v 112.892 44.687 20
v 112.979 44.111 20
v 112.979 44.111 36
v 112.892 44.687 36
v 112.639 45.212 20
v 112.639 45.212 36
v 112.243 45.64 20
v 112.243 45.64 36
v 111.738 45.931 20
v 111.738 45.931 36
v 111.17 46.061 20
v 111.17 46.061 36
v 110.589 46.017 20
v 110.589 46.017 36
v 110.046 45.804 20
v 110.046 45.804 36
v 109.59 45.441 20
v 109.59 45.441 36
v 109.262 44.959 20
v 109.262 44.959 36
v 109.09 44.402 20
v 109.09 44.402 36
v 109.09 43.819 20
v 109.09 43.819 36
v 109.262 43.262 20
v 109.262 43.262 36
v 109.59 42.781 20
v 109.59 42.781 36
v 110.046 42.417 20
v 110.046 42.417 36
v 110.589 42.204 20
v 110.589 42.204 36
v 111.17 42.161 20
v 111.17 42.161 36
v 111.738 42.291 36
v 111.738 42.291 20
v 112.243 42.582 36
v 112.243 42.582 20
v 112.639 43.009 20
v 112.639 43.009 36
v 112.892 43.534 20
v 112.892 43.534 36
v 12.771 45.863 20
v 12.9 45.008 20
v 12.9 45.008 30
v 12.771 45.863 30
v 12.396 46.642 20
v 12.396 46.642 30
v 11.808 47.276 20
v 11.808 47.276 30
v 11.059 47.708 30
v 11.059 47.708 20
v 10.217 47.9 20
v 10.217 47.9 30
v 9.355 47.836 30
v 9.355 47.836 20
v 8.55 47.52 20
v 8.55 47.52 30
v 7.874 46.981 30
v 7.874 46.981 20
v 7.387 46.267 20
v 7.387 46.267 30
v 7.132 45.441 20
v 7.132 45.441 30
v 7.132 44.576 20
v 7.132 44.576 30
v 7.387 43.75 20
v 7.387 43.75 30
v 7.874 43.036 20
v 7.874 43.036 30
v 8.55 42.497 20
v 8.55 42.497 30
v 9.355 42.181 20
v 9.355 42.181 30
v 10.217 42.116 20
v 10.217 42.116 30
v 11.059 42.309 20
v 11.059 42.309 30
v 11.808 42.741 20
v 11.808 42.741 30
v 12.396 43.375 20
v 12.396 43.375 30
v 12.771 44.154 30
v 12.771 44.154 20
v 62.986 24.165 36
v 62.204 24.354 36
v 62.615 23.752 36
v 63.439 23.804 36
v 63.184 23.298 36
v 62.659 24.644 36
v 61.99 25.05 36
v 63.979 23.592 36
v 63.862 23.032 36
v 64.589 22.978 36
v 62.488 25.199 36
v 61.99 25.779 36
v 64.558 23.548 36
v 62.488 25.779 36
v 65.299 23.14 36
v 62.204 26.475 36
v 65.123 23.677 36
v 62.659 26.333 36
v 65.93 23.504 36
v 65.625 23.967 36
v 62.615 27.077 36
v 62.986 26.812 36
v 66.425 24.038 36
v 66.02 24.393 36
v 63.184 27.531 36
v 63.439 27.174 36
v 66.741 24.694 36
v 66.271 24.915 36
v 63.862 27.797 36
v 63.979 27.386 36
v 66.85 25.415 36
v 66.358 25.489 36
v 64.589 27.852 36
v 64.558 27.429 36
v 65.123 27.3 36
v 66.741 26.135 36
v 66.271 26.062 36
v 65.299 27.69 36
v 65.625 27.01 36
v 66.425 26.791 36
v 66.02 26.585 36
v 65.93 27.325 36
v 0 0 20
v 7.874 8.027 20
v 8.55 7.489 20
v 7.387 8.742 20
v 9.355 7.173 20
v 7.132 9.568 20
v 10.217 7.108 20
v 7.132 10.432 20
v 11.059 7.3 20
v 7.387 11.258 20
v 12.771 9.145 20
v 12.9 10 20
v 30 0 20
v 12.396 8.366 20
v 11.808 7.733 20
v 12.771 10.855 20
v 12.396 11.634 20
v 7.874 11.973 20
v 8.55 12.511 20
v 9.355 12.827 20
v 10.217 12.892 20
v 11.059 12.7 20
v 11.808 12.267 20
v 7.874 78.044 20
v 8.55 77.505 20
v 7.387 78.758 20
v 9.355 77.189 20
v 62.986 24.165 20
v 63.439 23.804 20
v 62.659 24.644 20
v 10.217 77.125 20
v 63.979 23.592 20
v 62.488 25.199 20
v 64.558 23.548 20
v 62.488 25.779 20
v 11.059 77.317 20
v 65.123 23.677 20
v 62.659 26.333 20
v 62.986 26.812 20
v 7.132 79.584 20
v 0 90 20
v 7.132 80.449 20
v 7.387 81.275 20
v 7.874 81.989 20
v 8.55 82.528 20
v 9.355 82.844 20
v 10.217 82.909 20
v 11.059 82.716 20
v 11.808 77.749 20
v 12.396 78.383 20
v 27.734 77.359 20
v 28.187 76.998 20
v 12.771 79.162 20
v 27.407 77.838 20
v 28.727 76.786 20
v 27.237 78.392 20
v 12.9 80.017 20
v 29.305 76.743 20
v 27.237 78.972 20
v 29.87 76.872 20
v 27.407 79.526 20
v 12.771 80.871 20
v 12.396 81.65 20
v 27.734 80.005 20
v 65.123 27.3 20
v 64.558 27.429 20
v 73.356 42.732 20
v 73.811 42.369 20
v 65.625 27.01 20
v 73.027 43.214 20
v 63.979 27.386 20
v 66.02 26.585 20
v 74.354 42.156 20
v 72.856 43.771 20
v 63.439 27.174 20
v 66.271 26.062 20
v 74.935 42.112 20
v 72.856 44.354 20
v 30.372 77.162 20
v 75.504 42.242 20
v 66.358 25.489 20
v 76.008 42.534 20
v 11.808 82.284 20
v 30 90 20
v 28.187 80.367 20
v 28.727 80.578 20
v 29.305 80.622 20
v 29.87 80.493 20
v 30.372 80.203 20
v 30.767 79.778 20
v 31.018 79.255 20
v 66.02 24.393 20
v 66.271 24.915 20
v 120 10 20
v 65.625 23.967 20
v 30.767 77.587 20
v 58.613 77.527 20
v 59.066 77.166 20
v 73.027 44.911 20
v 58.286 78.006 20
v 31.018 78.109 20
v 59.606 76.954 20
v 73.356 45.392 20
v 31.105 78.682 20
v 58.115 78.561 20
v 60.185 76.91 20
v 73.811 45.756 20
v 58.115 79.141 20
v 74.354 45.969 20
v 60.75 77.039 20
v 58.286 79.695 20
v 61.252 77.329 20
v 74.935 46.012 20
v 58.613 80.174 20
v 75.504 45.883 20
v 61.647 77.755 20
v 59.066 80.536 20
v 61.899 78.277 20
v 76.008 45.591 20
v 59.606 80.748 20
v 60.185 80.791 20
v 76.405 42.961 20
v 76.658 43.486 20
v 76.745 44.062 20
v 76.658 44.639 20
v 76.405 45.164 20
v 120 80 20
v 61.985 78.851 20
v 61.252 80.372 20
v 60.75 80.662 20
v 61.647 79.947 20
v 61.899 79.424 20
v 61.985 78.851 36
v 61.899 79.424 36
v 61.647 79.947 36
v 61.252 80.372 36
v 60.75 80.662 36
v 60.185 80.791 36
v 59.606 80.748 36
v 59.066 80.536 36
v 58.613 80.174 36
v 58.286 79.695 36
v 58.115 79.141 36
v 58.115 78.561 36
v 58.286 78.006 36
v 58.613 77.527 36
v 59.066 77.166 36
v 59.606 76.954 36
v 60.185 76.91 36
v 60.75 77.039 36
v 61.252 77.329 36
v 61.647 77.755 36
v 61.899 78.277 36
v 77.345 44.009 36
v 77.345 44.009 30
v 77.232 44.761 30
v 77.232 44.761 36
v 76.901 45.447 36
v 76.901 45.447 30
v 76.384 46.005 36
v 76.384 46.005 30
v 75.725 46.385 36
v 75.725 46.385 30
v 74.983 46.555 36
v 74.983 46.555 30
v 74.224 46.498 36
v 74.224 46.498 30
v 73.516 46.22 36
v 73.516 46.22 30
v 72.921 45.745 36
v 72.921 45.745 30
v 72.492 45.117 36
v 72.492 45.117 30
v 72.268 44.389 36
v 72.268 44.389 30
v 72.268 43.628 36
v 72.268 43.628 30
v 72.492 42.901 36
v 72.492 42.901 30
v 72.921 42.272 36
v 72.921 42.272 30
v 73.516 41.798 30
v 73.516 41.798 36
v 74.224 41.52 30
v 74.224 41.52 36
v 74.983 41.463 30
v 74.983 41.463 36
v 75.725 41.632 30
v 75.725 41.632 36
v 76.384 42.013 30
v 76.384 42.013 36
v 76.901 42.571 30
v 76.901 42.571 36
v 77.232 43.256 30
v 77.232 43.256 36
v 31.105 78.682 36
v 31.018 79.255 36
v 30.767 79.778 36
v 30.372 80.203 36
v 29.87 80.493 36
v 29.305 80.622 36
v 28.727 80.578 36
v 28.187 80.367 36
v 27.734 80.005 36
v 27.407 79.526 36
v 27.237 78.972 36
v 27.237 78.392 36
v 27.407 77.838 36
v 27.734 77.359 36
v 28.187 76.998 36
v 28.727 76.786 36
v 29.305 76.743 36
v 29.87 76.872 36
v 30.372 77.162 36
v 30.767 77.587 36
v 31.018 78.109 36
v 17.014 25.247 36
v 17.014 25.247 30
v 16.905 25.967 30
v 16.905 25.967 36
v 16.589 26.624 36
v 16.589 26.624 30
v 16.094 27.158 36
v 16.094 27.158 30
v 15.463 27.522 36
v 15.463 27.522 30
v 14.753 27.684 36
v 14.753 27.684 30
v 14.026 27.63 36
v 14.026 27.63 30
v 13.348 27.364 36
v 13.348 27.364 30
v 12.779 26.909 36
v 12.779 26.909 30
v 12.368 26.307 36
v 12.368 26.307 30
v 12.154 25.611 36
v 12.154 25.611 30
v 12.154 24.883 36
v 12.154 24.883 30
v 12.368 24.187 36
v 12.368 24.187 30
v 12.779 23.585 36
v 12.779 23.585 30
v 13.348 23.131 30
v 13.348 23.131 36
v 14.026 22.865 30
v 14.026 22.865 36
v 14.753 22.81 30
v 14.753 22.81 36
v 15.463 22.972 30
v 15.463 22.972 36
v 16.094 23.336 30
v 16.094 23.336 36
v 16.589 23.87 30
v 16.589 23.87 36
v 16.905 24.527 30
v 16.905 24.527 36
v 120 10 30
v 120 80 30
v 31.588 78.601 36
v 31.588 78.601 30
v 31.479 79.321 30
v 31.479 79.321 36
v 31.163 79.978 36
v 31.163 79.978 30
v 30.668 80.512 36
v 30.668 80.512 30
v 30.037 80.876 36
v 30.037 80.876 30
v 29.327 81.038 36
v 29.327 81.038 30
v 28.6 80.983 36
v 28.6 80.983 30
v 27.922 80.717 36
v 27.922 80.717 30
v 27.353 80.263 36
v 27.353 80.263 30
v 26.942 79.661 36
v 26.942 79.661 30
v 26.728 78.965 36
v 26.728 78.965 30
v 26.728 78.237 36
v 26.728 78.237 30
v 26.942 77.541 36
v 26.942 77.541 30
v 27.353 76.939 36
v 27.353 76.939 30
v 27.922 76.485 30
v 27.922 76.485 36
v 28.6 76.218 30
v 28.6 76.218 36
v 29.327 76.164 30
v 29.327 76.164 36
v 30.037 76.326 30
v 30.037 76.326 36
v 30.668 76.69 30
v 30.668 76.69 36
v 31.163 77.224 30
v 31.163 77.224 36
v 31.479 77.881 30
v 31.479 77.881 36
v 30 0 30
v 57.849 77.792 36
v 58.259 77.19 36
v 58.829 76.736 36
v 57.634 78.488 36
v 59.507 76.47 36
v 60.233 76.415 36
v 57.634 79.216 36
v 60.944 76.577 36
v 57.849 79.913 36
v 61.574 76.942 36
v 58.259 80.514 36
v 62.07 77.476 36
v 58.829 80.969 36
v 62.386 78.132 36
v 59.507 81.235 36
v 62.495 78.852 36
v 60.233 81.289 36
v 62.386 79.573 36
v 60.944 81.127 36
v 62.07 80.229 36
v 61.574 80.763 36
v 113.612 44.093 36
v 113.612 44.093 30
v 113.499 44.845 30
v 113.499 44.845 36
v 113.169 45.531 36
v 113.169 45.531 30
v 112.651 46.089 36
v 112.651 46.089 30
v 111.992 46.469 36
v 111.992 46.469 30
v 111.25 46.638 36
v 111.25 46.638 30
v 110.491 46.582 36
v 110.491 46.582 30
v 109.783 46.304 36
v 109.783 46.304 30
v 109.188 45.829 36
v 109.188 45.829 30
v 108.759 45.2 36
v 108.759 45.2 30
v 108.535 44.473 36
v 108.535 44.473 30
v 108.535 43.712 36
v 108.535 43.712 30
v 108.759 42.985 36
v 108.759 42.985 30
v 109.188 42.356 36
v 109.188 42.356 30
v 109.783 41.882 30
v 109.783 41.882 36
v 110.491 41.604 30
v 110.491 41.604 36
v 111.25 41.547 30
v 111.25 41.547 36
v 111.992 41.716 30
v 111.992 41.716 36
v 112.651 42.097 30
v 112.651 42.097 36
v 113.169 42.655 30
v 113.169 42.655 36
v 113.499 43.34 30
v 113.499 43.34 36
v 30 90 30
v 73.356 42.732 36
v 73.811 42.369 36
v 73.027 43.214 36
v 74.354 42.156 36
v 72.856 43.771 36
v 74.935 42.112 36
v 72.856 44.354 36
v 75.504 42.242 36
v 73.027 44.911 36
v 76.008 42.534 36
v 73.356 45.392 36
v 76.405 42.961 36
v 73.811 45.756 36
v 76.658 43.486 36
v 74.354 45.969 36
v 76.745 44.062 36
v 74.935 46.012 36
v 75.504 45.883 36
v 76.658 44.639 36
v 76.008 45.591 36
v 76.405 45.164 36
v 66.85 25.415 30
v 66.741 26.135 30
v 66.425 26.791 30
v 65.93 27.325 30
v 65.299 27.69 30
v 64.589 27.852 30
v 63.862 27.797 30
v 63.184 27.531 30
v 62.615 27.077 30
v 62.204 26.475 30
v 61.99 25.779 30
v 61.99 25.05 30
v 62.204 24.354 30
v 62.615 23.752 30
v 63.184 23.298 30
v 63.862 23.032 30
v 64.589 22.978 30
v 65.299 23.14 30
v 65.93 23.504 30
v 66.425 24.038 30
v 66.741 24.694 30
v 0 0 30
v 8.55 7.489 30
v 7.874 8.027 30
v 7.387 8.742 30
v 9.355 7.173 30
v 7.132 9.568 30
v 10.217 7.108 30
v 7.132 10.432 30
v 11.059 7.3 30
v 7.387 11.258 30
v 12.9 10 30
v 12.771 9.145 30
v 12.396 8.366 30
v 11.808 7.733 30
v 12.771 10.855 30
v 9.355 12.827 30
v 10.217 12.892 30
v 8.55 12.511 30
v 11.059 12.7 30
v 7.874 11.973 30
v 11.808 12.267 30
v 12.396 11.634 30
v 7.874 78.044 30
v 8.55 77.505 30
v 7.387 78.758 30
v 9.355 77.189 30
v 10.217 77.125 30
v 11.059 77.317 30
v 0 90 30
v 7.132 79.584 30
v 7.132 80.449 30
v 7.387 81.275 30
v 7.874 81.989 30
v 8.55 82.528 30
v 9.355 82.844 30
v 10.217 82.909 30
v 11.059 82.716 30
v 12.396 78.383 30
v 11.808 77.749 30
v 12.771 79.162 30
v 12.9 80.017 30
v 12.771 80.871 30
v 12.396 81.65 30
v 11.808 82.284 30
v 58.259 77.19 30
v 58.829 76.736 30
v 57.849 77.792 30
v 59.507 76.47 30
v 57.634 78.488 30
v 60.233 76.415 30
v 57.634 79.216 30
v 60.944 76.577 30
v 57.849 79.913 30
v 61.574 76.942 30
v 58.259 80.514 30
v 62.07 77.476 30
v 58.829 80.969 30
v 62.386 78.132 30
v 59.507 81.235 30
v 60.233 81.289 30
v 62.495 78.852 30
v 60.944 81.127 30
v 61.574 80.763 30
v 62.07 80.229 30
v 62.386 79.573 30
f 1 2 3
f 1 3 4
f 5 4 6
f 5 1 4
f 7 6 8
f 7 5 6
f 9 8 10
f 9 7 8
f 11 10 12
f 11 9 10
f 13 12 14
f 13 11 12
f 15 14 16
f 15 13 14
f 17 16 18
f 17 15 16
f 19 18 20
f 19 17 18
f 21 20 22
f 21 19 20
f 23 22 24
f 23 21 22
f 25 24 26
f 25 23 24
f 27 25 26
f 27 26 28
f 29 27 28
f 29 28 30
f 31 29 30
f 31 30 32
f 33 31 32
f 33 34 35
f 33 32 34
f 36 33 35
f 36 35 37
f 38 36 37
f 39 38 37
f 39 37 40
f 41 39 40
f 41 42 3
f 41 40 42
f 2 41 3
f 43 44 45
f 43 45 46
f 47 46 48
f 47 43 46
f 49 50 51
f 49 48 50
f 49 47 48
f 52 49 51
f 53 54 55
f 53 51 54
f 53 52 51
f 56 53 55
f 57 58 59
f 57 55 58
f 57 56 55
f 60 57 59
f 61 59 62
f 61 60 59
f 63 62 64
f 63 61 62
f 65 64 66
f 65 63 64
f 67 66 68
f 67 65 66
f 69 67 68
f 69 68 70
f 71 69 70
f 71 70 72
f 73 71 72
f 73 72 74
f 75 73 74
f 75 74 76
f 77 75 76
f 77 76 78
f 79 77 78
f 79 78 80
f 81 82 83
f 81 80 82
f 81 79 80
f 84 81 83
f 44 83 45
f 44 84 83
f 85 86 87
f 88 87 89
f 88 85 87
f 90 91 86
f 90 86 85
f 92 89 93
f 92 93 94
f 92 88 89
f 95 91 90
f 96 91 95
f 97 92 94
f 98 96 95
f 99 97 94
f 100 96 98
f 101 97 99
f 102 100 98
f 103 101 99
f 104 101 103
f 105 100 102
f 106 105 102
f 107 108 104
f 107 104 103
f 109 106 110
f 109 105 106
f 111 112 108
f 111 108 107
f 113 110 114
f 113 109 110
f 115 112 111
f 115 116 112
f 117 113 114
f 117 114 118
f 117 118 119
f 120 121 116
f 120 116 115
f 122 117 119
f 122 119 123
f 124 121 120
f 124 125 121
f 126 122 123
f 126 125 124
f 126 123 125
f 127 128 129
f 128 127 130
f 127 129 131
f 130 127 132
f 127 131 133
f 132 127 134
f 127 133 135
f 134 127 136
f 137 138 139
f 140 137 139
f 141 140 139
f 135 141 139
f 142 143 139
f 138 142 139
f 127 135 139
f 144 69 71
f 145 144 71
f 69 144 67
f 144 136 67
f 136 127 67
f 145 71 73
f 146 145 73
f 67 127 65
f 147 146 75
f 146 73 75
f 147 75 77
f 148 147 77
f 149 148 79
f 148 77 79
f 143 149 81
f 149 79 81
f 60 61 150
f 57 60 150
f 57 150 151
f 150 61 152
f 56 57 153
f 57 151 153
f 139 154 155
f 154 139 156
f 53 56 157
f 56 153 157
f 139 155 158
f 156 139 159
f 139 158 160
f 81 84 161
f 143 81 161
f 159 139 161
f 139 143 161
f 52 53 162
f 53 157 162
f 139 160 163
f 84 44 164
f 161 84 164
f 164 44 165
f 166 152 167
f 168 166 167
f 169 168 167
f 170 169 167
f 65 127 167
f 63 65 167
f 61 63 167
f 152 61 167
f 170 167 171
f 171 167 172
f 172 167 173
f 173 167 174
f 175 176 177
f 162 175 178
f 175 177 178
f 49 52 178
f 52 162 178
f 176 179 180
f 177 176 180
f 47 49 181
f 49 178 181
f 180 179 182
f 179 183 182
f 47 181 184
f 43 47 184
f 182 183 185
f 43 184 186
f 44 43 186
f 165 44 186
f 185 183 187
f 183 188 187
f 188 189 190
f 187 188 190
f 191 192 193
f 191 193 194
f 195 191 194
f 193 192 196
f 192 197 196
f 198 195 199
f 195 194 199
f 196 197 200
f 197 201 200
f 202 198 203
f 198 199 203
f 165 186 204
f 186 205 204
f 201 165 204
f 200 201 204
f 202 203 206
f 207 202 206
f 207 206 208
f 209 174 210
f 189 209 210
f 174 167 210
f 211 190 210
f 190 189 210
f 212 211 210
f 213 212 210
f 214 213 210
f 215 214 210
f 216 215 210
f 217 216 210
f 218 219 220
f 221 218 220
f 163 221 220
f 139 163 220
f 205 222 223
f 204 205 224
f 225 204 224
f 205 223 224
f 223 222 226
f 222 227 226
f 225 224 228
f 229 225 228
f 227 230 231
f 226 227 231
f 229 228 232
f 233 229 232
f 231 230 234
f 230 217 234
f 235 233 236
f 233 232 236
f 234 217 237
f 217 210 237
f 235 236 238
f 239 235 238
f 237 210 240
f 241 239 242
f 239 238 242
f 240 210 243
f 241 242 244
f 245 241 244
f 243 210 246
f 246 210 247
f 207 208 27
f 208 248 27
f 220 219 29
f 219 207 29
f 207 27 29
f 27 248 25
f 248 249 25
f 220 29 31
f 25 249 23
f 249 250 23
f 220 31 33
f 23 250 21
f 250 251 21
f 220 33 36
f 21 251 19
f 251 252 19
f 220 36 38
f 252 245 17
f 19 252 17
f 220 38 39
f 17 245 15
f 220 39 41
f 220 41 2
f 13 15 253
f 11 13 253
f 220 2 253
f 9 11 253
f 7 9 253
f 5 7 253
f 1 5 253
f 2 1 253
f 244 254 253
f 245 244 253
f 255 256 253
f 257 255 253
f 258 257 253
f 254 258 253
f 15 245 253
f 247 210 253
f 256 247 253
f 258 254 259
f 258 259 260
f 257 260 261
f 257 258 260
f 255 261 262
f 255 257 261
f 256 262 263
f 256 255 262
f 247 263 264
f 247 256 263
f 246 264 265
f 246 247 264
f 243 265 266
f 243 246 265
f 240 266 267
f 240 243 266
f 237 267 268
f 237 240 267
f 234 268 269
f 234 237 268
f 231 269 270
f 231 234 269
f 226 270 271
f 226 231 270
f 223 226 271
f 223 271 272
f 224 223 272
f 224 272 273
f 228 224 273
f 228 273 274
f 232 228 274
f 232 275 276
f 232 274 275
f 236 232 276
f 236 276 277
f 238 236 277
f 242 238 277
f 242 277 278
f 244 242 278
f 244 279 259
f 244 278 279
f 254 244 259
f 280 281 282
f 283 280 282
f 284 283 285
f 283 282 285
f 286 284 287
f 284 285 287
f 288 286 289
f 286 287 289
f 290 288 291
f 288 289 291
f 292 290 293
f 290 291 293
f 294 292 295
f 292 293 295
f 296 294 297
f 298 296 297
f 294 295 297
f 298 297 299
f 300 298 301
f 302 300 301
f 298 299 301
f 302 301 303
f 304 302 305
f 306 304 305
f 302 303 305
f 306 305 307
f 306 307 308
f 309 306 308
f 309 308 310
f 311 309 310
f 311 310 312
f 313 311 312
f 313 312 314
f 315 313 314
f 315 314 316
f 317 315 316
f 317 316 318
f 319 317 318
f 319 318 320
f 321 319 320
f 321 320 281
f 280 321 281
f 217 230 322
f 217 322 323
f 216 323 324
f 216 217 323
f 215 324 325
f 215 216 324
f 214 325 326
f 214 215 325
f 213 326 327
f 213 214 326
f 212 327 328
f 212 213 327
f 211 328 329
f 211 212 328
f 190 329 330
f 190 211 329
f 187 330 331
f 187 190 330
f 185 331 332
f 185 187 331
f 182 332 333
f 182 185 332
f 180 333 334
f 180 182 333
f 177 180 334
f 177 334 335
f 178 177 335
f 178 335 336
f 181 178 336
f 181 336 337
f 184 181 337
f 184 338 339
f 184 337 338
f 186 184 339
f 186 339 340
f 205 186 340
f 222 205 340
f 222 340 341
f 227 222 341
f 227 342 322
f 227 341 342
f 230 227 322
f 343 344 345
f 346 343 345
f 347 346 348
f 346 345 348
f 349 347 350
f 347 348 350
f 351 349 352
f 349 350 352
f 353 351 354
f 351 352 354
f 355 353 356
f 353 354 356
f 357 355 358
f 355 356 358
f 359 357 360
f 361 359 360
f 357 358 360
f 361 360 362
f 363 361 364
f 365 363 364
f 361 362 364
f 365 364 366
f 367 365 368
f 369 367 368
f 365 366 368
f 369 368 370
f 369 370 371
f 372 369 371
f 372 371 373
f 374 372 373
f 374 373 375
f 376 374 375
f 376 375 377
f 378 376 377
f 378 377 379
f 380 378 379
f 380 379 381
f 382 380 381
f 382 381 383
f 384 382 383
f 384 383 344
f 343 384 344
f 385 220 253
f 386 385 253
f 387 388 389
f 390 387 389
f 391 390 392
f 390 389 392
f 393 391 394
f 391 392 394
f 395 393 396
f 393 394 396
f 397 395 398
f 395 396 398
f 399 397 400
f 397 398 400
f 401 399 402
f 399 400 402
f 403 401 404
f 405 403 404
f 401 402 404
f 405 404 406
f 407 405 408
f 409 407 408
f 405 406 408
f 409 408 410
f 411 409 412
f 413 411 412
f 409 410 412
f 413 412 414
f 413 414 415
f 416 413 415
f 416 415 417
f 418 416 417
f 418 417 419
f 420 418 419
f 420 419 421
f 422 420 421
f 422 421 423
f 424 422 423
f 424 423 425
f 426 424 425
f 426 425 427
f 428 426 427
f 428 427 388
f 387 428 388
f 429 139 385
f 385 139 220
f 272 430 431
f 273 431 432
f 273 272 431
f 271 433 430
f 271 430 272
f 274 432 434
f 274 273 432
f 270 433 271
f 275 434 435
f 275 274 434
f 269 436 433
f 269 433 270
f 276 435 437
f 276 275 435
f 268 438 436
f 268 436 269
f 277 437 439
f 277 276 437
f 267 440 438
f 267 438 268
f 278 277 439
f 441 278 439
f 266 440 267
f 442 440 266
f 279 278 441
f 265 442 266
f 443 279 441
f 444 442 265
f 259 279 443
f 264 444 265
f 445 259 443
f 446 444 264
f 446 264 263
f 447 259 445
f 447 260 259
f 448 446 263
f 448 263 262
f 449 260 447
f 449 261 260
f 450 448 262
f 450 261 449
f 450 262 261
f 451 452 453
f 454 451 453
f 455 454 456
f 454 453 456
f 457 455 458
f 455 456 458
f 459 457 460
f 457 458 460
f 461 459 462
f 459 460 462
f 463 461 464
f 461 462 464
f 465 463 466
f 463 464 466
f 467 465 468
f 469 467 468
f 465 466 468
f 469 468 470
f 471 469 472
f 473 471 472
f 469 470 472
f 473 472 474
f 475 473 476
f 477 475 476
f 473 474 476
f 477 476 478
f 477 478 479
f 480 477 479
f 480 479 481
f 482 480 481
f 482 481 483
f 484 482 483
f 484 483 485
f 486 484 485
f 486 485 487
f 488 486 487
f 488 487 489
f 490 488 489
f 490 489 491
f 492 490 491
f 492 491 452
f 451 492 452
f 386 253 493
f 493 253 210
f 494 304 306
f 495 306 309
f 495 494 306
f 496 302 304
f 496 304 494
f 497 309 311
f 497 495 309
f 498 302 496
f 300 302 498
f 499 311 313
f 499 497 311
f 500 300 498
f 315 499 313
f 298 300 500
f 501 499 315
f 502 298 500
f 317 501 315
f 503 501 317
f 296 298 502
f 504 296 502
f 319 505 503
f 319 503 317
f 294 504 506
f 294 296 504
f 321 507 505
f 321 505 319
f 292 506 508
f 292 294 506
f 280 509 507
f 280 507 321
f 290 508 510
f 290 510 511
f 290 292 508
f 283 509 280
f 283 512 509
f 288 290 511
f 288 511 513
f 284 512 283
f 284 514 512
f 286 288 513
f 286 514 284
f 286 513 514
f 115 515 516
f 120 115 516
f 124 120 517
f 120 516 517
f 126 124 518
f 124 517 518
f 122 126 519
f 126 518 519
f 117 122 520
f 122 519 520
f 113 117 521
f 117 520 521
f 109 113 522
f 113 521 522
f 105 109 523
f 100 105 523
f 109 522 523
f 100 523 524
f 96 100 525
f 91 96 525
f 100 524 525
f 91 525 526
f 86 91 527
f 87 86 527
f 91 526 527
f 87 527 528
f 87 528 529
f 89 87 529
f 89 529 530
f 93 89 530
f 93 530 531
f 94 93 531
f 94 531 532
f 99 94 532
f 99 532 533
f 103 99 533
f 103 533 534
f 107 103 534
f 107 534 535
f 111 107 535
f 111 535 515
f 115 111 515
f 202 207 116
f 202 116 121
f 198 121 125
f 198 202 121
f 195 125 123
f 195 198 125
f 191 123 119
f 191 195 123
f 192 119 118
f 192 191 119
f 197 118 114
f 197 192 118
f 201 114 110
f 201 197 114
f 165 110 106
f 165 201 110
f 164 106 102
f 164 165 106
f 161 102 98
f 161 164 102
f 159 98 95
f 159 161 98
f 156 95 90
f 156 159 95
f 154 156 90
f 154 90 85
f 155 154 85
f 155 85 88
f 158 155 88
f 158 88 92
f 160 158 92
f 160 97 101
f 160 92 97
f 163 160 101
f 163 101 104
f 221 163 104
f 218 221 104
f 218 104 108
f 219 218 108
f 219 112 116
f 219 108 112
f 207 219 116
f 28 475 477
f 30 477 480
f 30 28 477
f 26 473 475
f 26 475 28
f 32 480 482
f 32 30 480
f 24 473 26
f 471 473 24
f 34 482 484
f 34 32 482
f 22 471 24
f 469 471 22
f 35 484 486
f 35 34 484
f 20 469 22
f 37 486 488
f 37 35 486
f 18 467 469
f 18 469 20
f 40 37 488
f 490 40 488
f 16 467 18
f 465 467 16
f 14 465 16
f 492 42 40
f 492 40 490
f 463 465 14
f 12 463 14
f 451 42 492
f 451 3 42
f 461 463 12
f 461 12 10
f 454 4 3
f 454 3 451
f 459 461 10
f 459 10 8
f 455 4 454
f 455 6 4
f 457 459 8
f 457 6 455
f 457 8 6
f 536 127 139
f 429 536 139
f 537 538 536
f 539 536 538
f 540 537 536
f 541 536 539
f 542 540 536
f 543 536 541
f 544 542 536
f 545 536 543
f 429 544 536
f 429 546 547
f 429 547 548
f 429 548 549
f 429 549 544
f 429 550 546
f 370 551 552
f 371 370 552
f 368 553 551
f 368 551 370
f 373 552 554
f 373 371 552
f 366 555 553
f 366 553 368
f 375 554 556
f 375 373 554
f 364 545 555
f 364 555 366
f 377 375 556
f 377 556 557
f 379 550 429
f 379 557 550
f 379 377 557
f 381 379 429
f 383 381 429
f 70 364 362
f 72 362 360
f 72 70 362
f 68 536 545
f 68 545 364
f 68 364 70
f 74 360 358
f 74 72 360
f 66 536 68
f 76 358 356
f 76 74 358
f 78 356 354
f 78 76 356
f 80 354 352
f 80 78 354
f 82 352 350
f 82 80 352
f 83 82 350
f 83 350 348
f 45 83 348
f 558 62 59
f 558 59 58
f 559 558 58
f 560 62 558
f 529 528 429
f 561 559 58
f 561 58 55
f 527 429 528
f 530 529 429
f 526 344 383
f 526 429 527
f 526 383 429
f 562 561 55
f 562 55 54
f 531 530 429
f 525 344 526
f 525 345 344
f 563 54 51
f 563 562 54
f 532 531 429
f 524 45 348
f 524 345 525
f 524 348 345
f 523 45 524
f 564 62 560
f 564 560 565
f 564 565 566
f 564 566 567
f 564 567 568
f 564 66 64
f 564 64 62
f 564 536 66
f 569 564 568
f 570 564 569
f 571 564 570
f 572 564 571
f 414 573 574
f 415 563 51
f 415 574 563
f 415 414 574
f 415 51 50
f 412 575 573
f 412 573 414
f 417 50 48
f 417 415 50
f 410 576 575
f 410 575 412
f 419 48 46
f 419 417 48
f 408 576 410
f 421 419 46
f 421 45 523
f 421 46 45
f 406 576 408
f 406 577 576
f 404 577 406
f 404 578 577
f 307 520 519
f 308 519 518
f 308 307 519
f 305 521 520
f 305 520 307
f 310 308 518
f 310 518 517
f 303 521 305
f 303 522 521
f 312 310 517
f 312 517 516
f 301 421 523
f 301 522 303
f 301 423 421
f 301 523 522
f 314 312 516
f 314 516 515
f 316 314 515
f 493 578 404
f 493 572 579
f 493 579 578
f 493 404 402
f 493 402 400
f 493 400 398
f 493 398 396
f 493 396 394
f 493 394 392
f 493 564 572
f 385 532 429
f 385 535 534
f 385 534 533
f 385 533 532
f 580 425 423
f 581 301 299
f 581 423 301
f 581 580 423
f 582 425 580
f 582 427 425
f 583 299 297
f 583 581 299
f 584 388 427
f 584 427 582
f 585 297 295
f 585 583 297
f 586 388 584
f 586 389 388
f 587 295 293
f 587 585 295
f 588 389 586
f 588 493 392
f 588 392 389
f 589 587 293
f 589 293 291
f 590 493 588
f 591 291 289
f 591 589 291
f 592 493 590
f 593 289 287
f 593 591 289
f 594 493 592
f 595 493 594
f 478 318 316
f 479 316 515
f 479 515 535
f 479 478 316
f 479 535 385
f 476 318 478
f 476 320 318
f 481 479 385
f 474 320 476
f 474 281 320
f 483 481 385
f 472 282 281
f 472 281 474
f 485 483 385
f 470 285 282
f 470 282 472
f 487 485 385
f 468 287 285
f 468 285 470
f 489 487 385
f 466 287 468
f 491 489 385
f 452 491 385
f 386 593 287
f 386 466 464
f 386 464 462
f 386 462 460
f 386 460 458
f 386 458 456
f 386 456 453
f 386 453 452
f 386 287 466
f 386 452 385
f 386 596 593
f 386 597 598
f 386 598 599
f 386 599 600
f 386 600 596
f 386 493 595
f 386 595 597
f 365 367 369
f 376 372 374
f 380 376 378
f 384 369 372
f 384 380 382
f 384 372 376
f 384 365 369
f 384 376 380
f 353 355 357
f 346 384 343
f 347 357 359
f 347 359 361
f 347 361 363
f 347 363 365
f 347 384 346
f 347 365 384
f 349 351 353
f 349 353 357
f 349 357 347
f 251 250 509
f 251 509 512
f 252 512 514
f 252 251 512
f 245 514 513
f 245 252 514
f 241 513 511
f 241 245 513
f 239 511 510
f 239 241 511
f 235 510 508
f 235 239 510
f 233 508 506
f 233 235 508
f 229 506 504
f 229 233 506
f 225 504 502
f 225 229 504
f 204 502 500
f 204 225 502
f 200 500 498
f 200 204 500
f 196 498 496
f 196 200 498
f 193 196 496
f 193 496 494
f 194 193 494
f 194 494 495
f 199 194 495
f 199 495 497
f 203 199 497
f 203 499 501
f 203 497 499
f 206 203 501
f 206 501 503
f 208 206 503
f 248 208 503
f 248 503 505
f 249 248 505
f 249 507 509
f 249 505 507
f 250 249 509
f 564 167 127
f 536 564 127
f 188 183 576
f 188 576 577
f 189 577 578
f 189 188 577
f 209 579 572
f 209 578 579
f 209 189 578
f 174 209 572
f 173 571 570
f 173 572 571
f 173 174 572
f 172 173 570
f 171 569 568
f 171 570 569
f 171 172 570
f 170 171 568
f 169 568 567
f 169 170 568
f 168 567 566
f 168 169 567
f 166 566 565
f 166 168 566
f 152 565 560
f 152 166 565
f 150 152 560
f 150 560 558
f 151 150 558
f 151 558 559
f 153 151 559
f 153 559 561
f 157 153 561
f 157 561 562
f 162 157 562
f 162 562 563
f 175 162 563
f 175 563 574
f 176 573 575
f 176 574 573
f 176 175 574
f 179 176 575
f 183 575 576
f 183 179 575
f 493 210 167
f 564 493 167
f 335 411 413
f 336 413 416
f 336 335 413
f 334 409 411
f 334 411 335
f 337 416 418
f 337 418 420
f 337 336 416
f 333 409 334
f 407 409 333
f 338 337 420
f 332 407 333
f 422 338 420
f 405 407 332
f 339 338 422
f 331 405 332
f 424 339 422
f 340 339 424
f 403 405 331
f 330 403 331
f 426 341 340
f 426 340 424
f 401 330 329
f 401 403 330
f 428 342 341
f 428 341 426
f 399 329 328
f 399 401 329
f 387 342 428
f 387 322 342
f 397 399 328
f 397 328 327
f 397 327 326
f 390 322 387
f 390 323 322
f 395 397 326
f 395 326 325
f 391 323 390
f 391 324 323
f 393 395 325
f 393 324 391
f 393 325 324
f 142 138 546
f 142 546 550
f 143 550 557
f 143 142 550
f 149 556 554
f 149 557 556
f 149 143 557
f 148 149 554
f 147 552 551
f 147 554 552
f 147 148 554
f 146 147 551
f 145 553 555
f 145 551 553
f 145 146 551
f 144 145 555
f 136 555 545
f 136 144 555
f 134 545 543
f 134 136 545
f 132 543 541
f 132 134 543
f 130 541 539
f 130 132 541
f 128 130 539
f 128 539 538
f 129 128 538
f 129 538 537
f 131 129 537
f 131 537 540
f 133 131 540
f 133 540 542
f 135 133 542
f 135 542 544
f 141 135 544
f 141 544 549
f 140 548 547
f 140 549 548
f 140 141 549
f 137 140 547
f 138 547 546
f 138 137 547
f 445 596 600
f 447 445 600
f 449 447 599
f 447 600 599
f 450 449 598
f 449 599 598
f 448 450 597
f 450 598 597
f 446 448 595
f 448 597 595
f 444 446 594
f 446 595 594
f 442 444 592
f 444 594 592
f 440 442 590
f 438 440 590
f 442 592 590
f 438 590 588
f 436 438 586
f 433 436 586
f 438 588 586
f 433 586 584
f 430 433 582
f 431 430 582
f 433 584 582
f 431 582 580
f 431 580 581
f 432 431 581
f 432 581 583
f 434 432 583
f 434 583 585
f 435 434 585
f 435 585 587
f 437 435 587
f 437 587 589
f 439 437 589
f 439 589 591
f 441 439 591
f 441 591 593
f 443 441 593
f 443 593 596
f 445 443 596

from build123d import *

# Parameters (mm, degrees)
SKETCH018_R      = 1.955414
SKETCH018_R_2    = 1.945
SKETCH018_R_3    = 1.945712
EXTRUDE021_DEPTH = 30
SKETCH017_R      = 2.552893
SKETCH017_R_2    = 2.443798
EXTRUDE020_DEPTH = 10
SKETCH003_R      = 2.9
EXTRUDE004_DEPTH = 50
EXTRUDE001_DEPTH = 10


with BuildPart() as extrude021:
    # Sketch018 (on Face20 of Fusion002) → Extrude021 (new body)
    with BuildSketch(Plane.XY.offset(36)):
        with Locations((74.789169, 44.062363)):
            Circle(SKETCH018_R)
        with Locations((111.023758, 44.110783)):
            Circle(SKETCH018_R)
        with Locations((29.159777, 78.682182)):
            Circle(SKETCH018_R_2)
        with Locations((60.039303, 78.850616)):
            Circle(SKETCH018_R_3)
        with Locations((64.412148, 25.488655)):
            Circle(SKETCH018_R_3)
    extrude(amount=EXTRUDE021_DEPTH)


with BuildPart() as extrude021_1:
    # Extrude021 placement: moved
    add(extrude021.part.moved(Location((0, 0, -22))))


with BuildPart() as base_tornillos:
    # Sketch017 (on Face5 of Cut001) → Extrude020 (new body)
    with BuildSketch(Plane.XY.offset(30)):
        with Locations((74.792107, 44.0089)):
            Circle(SKETCH017_R)
        with Locations((111.059273, 44.092655)):
            Circle(SKETCH017_R)
        with Locations((60.050713, 78.85218)):
            Circle(SKETCH017_R_2)
        with Locations((29.144051, 78.600906)):
            Circle(SKETCH017_R_2)
        with Locations((14.570175, 25.247131)):
            Circle(SKETCH017_R_2)
        with Locations((64.40612, 25.414646)):
            Circle(SKETCH017_R_2)
    extrude(amount=EXTRUDE020_DEPTH)


with BuildPart() as base_tornillos_1:
    # Extrude020 placement: moved
    add(base_tornillos.part.moved(Location((0, 0, -4))))


with BuildPart() as tornillos001:
    # Sketch003 (on Face8 of Extrude002) → Extrude004 (new body)
    with BuildSketch(Plane.XY.offset(10)):
        with Locations((10, 80.016689)):
            Circle(SKETCH003_R)
        with Locations((10, 45.008344)):
            Circle(SKETCH003_R)
        with Locations((10, 10)):
            Circle(SKETCH003_R)
    extrude(amount=EXTRUDE004_DEPTH)


with BuildPart() as tornillos001_1:
    # Extrude004 placement: moved
    add(tornillos001.part.moved(Location((0, 0, -21))))


with BuildPart() as base_delantera_superior:
    # Sketch001 → Extrude001 (new body)
    with BuildSketch(Plane.XY):
        Polygon((0, 0), (30, 0), (120, 10), (120, 80), (30, 90), (0, 90), align=None)
    extrude(amount=EXTRUDE001_DEPTH)

    # Cut001: cut Tornillos001
    add(tornillos001_1.part, mode=Mode.SUBTRACT)


with BuildPart() as base_delantera_superior_1:
    # Cut001 placement: moved
    add(base_delantera_superior.part.moved(Location((0, 0, 20))))

    # Fusion002: union Base tornillos
    add(base_tornillos_1.part)

    # Cut009: cut Extrude021
    add(extrude021_1.part, mode=Mode.SUBTRACT)


solid = base_delantera_superior_1.part
